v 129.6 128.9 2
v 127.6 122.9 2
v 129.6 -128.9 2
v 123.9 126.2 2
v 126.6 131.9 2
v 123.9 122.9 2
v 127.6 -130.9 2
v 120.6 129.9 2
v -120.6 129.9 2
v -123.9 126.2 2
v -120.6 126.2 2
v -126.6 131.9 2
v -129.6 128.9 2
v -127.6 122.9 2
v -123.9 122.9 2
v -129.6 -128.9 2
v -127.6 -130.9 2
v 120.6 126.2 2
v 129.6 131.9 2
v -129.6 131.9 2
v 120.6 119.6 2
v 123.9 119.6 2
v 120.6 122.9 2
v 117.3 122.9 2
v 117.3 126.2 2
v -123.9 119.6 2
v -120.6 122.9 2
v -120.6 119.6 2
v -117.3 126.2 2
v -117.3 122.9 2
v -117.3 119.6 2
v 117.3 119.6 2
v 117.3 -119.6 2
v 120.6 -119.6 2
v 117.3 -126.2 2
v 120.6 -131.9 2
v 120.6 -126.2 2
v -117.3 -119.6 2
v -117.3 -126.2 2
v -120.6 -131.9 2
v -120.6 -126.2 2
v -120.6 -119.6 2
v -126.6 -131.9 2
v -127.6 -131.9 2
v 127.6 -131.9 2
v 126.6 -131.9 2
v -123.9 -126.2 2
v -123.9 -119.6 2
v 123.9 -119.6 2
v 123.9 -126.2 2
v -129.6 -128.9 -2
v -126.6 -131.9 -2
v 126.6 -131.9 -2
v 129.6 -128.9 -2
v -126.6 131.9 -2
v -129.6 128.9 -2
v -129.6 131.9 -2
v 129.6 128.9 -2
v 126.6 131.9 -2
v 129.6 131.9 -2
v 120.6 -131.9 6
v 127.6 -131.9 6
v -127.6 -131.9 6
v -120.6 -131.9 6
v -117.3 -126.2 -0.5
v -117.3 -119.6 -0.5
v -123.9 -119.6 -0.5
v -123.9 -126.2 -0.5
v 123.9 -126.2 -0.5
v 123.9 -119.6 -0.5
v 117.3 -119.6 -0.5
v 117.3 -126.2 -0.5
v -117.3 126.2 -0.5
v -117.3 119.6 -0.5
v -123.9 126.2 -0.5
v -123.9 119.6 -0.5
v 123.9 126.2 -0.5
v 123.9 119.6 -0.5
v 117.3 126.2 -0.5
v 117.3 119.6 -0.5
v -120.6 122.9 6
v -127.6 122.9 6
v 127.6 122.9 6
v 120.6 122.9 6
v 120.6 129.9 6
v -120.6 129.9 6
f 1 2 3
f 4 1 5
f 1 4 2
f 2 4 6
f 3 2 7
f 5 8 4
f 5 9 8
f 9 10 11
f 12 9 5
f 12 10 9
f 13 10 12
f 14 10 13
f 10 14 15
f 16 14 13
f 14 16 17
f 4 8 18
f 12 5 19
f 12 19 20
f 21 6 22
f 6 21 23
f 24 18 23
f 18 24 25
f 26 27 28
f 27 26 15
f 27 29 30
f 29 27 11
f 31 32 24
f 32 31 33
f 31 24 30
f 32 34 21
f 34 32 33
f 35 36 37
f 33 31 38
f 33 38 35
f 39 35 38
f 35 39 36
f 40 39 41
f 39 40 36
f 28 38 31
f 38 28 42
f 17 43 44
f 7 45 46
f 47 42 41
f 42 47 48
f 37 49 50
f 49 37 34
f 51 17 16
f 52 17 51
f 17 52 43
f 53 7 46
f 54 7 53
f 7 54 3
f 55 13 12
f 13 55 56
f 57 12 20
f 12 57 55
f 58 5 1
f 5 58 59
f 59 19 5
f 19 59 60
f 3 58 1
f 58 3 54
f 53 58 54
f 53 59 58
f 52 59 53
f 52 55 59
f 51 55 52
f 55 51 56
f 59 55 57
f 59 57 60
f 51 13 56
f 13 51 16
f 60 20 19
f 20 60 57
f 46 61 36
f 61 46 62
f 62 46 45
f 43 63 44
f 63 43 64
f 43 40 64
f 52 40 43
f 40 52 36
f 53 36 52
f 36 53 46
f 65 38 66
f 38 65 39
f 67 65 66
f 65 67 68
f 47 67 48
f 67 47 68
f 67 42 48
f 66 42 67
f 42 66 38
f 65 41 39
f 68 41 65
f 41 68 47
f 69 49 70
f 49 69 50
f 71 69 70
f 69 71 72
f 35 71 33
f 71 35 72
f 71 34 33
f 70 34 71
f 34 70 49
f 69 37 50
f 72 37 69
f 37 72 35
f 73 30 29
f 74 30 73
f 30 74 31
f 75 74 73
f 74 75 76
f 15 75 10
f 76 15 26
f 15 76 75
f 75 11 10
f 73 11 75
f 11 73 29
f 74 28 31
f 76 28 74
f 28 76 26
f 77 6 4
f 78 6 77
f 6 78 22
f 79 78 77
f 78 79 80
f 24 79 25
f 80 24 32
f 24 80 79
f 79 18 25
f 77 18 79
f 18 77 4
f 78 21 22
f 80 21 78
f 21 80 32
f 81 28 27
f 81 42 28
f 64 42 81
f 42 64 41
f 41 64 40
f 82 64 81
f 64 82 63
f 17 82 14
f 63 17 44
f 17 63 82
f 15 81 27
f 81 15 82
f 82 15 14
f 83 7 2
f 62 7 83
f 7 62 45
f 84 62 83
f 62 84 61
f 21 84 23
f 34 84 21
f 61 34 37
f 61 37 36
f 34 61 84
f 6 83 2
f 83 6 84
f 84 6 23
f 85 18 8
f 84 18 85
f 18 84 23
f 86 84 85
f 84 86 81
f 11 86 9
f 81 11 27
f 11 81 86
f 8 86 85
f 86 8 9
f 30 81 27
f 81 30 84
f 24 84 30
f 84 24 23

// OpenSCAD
// WheresDat — Shelf floor, split out from the original fused
// floor+3-walls design in shelf.scad. See shelf_side.scad for the full
// rationale — a separate flat plate has no tall walls rising off it to
// drive uneven cooling, so it should print much flatter on its own.
//
// Same footprint as the old fused floor. A raised tongue runs along the
// left/right/back edges (front stays free, same as before - open front,
// no wall there), rising from this plate's top surface into the matching
// groove cut into the bottom of shelf_side.scad / shelf_back.scad, and
// gets glued there. This is a separate 4mm-tall feature sitting on top
// of the 4mm floor slab - it does not change floor_thickness or require
// any change to the walls' wall_height, since the groove is already cut
// starting right where the wall's own bottom meets the floor's top, not
// into the floor's own body.
//
// Supersedes shelf.scad. Not yet rendered/validated - open in the app
// and test-fit against a printed side/back piece before committing to a
// full run of 8.

/* [Printer] */
max_footprint = 280; // mm

/* [Post geometry — must match shelf_side.scad and shelf_back.scad] */
post_size      = 6;
post_clearance = 0.3;

/* [Footprint — must match shelf_side.scad and shelf_back.scad] */
post_spacing_x = 241.2;
post_spacing_y = 245.8;

/* [Floor construction] */
// wall_thickness here only sizes the floor to match the wall pieces'
// footprint — must match shelf_side.scad / shelf_back.scad.
min_wall        = 3;
wall_thickness  = post_size + min_wall; // 9mm
floor_thickness = 4; // mm — must match shelf_side.scad / shelf_back.scad's rabbet_height calc

/* [Edge tongue — must fit shelf_side.scad / shelf_back.scad's groove:
   tongue_height + tongue_clearance must equal their rabbet_height] */
tongue_height    = 4;   // mm, rises from this plate's own top surface
tongue_clearance = 0.3; // mm, so the tongue seats without binding
// Same horizontal reach as the wall pieces' rabbet_depth — must match.
tongue_depth = 7; // mm, inward from the wall's inner face

/* [Base chamfer — relieves corner curling on the print bed] */
chamfer_size   = 3; // mm
chamfer_height = floor_thickness;

// ---------------------------------------------------------------------
// Derived geometry
// ---------------------------------------------------------------------

floor_x = post_spacing_x + 2 * wall_thickness;
floor_y = post_spacing_y + 2 * wall_thickness;

assert(floor_x <= max_footprint,
    str("Shelf floor X (", floor_x, "mm) exceeds max_footprint (", max_footprint, "mm)"));
assert(floor_y <= max_footprint,
    str("Shelf floor Y (", floor_y, "mm) exceeds max_footprint (", max_footprint, "mm)"));

module post_socket(x, y) {
    translate([x, y, floor_thickness / 2])
        cube([post_size + 2 * post_clearance, post_size + 2 * post_clearance, floor_thickness + 1], center = true);
}

module base_chamfer_cut(width, depth, size, height) {
    corners = [[0, 0], [width, 0], [0, depth], [width, depth]];
    for (c = corners) {
        dx = (c[0] == 0) ? 1 : -1;
        dy = (c[1] == 0) ? 1 : -1;
        translate([c[0], c[1], -0.5])
            linear_extrude(height = height + 0.5)
                polygon([[0, 0], [dx * size, 0], [0, dy * size]]);
    }
}

// Tongue strips along the straight runs only (front-corner to where the
// back corner's diagonal cut starts / post_spacing_x corner-to-corner for
// the back edge) — same simplification shelf_side.scad / shelf_back.scad
// make for their groove, skipping the small diagonal-corner triangle.
module edge_tongues() {
    run_y = floor_y - wall_thickness; // front to the back diagonal's start

    // Left
    translate([-post_spacing_x / 2 - tongue_depth, -floor_y / 2, floor_thickness / 2])
        cube([tongue_depth, run_y, tongue_height]);
    // Right
    translate([post_spacing_x / 2, -floor_y / 2, floor_thickness / 2])
        cube([tongue_depth, run_y, tongue_height]);
    // Back
    translate([-post_spacing_x / 2, post_spacing_y / 2, floor_thickness / 2])
        cube([post_spacing_x, tongue_depth, tongue_height]);
}

module shelf_floor() {
    union() {
        difference() {
            cube([floor_x, floor_y, floor_thickness], center = true);

            post_socket(-post_spacing_x / 2, -post_spacing_y / 2);
            post_socket(post_spacing_x / 2, -post_spacing_y / 2);
            post_socket(-post_spacing_x / 2, post_spacing_y / 2);
            post_socket(post_spacing_x / 2, post_spacing_y / 2);

            translate([-floor_x / 2, -floor_y / 2, -floor_thickness / 2])
                base_chamfer_cut(floor_x, floor_y, chamfer_size, chamfer_height);
        }
        edge_tongues();
    }
}

shelf_floor();
